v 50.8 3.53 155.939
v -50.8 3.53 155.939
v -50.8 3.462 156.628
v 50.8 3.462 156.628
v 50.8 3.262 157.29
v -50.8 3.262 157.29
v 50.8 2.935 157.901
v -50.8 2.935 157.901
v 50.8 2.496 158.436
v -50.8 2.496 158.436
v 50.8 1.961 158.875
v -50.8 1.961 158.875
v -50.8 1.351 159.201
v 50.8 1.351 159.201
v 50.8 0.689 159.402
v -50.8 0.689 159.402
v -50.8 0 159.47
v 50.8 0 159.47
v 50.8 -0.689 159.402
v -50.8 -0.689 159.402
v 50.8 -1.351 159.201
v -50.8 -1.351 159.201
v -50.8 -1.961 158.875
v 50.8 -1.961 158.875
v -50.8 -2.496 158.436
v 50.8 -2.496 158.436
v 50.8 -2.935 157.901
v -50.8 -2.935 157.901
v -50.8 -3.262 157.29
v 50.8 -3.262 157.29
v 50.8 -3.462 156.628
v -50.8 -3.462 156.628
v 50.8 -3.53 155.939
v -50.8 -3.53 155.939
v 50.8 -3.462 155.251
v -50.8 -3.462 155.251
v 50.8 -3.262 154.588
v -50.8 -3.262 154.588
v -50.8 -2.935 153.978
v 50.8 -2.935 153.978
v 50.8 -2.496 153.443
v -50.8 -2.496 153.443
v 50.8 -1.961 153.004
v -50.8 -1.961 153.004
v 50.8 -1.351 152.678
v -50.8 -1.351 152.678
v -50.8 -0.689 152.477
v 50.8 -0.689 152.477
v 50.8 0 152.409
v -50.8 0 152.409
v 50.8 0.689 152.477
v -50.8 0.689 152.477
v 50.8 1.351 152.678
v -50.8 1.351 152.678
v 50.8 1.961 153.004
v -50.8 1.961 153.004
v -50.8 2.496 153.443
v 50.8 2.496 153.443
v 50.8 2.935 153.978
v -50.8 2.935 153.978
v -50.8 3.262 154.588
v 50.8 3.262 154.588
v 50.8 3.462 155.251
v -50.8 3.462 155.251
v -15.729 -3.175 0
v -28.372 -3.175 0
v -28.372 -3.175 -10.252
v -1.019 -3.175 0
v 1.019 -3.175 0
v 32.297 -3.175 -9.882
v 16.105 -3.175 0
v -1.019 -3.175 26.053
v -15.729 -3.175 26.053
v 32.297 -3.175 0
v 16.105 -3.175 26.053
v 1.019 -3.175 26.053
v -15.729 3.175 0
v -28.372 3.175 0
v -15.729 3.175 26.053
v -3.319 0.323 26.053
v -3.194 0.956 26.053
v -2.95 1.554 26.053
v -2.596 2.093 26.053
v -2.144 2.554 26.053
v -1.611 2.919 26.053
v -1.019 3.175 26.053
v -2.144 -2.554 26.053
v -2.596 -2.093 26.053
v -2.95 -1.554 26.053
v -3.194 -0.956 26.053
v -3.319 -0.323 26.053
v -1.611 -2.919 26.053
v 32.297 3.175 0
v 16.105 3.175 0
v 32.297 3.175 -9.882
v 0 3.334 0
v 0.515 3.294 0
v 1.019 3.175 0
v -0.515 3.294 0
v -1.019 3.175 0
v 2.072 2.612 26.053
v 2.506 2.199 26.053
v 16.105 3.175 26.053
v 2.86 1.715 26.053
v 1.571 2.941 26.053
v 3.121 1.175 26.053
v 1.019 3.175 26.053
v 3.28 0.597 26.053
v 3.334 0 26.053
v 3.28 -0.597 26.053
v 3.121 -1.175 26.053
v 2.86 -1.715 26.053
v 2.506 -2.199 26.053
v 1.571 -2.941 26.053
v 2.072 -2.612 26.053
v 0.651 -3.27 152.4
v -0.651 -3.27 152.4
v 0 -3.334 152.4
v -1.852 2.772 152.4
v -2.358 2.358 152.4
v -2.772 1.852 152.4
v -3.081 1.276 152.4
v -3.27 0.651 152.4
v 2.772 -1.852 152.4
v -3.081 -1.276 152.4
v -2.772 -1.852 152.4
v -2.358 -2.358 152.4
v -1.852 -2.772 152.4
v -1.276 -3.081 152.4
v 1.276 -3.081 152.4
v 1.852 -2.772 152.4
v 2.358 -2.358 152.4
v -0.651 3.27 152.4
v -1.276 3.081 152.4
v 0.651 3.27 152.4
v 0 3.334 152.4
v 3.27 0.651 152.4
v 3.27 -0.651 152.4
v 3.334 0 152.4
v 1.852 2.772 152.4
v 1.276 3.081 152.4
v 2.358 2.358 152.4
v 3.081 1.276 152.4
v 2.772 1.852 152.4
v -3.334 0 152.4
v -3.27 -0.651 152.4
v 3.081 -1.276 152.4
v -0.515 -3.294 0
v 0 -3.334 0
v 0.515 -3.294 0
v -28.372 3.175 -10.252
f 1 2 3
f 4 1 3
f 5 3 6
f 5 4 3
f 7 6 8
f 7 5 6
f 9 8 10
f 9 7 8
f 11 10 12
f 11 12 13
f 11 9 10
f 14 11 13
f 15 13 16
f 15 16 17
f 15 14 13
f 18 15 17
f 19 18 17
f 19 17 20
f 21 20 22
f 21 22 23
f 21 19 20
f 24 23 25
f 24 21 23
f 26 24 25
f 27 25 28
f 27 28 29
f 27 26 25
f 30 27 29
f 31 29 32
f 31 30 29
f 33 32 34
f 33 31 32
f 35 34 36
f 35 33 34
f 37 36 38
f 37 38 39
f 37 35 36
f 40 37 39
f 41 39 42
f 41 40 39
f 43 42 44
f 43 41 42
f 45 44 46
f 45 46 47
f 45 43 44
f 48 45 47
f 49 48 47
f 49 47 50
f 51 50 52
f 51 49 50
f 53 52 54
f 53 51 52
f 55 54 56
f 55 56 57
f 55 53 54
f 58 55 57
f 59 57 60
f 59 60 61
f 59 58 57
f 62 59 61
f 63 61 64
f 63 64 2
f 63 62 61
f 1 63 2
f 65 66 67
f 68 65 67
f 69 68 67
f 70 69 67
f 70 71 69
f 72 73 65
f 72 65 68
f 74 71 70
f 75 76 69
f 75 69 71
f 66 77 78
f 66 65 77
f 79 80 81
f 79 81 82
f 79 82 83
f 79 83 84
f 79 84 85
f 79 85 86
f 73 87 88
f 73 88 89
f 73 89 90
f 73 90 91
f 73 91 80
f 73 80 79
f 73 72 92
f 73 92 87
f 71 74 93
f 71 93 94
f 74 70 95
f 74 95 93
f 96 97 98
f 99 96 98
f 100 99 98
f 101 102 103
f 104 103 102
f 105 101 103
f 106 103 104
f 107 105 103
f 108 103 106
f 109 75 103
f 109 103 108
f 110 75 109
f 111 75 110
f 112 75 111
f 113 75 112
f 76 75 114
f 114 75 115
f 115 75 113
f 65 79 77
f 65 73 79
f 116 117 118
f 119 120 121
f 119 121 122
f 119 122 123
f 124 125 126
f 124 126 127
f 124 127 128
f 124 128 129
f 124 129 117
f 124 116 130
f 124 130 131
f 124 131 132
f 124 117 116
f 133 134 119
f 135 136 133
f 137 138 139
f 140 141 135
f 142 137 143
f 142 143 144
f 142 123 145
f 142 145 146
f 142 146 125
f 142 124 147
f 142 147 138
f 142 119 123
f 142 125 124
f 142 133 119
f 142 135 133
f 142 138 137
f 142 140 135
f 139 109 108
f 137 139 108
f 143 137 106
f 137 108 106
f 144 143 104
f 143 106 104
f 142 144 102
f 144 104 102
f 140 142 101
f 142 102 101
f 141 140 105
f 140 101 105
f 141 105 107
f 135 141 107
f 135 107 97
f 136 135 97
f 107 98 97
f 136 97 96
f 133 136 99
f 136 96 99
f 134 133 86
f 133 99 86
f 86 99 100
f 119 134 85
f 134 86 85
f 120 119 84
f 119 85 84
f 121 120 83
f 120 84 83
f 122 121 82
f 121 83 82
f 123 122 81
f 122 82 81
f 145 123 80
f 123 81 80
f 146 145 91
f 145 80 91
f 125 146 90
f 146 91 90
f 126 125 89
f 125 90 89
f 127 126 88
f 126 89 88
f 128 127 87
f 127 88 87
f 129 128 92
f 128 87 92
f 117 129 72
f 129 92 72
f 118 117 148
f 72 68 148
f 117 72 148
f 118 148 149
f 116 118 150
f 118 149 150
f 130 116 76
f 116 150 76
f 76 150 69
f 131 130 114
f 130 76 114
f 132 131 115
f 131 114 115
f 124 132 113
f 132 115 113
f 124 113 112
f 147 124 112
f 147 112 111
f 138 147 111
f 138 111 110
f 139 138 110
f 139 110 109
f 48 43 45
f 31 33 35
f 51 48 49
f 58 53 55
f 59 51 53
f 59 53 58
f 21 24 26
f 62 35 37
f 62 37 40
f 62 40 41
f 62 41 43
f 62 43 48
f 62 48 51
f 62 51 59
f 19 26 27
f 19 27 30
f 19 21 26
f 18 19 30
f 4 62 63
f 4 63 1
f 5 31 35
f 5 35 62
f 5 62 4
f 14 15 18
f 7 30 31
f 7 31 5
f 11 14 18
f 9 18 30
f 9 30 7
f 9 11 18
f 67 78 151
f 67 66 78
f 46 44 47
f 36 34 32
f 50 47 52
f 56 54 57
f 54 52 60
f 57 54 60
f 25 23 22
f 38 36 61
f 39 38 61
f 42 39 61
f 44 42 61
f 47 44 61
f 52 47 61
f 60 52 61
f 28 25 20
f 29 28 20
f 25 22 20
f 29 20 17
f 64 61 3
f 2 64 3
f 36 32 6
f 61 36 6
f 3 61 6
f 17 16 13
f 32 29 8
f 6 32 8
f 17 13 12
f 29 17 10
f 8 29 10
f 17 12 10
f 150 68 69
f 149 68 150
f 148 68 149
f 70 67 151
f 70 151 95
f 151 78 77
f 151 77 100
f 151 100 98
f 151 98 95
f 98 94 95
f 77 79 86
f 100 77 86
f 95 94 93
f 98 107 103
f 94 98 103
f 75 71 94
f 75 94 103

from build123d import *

# Parameters (mm, degrees)
F1_DEPTH = 3.175
F2_R     = 3.334372
F3_DEPTH = 152.4
F4_R     = 3.530314
F5_DEPTH = 50.8


with BuildPart() as f1:
    # F0 (on Front) → F1 (new body, symmetric)
    with BuildSketch(Plane.XZ):
        Polygon((-28.372129, 0), (-28.372129, -10.2515), (32.297498, -9.88215), (32.297498, 0), (16.10476, 0), (16.10476, 26.052793), (-15.728978, 26.052793), (-15.728978, 0), align=None)
    extrude(amount=F1_DEPTH, both=True)

    # F2 (on Top) → F3 (join)
    with BuildSketch(Plane.XY):
        Circle(F2_R)
    extrude(amount=F3_DEPTH)


with BuildPart() as f5:
    # F4 (on Right) → F5 (new body, symmetric)
    with BuildSketch(Plane.YZ):
        with Locations((0, 155.939415)):
            Circle(F4_R)
    extrude(amount=F5_DEPTH, both=True)


solid = Compound([f1.part, f5.part])
